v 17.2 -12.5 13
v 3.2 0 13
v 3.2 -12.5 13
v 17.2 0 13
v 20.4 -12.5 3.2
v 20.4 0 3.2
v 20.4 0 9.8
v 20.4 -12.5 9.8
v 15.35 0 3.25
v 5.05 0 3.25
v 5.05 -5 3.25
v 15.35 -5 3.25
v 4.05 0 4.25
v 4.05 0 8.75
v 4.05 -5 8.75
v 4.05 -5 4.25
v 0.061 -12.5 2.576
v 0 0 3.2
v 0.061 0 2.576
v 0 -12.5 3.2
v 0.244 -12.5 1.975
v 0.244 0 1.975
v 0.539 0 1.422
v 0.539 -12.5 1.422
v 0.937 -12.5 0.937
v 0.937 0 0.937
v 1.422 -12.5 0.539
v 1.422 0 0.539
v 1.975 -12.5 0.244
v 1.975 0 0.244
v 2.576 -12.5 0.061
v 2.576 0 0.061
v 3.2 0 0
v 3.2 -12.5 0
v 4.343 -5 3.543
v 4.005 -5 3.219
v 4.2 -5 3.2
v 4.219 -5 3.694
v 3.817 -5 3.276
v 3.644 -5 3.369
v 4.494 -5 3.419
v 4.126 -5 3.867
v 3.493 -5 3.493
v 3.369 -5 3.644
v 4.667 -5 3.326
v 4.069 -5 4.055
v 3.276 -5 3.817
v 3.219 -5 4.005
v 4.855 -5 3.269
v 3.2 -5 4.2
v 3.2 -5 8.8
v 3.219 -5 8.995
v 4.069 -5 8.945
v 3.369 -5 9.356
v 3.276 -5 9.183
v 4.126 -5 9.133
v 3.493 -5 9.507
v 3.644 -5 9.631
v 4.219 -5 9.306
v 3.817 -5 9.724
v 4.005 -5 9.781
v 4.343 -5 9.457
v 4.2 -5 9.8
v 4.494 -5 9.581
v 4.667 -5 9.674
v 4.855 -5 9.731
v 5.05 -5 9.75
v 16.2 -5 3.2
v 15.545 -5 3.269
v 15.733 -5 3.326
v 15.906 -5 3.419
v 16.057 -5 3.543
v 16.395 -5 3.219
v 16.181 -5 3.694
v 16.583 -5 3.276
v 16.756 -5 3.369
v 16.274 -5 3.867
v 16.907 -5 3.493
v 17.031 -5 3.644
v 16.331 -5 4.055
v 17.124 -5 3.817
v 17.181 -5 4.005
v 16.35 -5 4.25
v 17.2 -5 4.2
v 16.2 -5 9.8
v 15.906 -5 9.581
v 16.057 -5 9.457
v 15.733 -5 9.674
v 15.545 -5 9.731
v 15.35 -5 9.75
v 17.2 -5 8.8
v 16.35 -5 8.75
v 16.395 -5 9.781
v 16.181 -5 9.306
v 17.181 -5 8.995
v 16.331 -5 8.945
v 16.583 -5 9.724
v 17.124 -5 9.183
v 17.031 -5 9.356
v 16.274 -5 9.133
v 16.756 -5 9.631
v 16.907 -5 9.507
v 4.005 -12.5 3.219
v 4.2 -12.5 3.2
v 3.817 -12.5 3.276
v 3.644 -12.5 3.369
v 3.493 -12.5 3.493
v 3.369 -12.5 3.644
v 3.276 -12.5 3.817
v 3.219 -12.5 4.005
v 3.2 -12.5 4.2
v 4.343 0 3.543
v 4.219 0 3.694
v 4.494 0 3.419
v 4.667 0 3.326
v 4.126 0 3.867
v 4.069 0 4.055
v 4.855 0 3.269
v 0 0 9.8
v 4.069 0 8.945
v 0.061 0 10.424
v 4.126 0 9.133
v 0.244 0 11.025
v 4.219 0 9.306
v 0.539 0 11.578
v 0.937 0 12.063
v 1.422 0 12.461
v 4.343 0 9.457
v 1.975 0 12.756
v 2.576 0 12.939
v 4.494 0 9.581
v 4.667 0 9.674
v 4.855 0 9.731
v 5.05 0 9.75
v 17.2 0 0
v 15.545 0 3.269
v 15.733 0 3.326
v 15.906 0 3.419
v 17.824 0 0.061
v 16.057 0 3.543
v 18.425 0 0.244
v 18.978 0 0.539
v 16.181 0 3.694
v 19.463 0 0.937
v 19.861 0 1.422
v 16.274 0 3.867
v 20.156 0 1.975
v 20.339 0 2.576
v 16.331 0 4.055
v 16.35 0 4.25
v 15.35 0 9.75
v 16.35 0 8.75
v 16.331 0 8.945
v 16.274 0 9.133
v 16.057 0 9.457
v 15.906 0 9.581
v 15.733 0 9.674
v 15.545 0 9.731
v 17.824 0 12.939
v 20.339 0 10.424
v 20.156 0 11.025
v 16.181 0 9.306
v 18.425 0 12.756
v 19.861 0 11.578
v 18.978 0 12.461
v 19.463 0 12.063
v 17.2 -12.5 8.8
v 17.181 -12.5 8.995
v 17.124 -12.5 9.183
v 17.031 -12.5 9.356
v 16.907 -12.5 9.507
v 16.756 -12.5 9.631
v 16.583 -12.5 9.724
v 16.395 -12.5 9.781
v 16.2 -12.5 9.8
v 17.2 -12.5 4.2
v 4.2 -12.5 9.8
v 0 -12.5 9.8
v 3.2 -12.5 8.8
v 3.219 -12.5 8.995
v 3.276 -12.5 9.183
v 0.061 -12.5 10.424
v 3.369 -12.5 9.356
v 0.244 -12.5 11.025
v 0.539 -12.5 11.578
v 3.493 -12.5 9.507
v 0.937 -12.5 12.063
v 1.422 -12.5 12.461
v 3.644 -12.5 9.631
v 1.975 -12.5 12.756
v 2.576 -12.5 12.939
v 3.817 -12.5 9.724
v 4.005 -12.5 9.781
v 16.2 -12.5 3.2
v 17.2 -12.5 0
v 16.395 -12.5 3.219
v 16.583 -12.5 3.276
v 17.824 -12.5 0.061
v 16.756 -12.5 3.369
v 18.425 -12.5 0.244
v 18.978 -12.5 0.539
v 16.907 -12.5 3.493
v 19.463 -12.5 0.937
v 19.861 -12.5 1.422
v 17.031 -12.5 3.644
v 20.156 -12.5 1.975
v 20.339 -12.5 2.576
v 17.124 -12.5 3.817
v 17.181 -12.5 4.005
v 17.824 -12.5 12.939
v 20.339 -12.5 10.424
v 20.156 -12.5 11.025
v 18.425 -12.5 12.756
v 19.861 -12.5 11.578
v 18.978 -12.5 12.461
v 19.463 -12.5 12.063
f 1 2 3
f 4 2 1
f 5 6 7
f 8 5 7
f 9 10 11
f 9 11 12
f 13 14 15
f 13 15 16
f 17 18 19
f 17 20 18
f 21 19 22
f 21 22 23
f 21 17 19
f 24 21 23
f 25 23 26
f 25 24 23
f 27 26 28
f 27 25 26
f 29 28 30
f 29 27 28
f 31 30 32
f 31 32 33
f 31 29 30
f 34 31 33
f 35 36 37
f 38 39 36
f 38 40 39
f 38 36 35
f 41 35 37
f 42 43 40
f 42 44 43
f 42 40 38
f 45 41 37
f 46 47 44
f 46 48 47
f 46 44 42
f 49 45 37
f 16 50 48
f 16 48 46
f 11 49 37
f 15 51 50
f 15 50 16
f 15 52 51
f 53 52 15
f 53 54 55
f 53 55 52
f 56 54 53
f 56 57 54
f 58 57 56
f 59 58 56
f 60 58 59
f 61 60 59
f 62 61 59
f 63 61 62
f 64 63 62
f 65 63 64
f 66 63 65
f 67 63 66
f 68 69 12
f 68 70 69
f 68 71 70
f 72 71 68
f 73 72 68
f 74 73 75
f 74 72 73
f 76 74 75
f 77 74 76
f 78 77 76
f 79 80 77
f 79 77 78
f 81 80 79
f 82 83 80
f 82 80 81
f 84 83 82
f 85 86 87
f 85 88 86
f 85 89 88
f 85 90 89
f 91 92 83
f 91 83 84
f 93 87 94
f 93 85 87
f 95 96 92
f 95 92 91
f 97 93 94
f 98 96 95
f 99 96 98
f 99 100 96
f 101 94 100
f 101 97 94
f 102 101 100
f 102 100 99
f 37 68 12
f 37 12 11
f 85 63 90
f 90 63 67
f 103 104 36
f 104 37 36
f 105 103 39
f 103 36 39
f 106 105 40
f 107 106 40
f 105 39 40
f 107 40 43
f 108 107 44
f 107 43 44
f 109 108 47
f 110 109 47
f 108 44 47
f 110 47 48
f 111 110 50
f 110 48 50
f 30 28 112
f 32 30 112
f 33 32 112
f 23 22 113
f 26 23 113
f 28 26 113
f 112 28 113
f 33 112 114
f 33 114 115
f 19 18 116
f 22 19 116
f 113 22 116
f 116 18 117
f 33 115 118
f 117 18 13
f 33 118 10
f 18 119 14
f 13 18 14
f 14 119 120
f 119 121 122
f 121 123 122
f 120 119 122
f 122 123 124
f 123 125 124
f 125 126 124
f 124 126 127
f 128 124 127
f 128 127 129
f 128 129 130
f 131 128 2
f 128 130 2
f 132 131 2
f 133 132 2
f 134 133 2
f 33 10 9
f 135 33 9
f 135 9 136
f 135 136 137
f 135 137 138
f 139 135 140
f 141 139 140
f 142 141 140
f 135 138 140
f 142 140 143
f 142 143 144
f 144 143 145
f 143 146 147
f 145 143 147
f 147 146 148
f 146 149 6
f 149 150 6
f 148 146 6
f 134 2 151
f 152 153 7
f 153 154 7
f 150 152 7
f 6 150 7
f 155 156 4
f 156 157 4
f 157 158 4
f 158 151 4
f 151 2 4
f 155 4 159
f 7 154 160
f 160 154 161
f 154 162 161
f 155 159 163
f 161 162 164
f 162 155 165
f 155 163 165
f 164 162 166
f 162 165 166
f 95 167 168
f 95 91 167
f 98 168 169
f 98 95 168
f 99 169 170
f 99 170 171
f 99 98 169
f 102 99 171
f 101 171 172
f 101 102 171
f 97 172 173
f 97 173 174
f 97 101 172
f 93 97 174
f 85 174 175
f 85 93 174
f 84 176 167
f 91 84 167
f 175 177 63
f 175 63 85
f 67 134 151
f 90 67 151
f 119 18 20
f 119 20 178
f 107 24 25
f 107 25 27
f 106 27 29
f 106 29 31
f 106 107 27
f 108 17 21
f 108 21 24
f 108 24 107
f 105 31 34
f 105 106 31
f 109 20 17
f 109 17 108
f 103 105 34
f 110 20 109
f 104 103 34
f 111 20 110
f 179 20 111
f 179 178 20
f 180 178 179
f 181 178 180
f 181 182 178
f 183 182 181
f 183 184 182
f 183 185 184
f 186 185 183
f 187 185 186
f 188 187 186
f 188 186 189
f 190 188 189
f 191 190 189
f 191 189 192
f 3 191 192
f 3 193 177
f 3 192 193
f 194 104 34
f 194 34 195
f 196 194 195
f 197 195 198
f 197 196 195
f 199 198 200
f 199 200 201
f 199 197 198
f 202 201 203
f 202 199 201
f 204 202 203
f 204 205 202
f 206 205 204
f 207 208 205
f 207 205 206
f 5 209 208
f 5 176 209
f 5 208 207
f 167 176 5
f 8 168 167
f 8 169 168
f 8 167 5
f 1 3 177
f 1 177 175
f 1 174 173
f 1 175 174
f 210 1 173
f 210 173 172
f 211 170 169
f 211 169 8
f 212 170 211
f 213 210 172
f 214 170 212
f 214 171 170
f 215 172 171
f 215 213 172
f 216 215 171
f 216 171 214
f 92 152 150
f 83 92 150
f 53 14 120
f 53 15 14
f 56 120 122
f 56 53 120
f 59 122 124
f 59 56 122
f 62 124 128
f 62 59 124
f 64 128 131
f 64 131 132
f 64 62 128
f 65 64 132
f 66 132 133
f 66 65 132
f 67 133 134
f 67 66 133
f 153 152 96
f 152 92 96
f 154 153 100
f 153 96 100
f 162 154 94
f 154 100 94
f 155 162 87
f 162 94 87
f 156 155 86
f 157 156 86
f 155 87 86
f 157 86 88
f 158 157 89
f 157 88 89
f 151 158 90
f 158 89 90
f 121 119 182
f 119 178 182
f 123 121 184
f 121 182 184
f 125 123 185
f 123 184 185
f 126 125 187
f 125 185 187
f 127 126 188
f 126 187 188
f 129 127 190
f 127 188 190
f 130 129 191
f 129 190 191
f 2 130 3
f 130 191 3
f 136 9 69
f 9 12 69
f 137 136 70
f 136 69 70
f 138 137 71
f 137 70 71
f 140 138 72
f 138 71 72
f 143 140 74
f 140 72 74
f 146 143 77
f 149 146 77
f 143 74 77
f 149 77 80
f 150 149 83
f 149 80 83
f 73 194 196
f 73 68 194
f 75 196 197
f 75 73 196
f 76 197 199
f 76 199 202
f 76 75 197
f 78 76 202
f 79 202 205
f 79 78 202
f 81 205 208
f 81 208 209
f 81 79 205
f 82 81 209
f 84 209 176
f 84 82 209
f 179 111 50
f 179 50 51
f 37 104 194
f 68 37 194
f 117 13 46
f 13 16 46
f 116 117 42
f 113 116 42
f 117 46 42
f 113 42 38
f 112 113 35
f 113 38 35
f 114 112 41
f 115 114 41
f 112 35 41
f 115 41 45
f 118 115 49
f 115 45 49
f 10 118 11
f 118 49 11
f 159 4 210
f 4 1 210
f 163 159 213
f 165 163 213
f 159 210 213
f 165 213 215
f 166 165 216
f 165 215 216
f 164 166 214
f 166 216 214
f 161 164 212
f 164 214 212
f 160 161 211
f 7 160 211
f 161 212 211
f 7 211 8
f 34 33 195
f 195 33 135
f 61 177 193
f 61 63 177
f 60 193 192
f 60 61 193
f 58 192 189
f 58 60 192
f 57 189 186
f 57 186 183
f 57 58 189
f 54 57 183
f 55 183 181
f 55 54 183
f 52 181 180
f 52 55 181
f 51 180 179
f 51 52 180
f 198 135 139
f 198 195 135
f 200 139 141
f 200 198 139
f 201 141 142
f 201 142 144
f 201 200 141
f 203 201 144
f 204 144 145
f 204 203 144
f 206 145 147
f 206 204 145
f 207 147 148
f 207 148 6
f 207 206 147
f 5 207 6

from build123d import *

# Parameters (mm, degrees)
SKETCH058_W     = 20.4
SKETCH058_H     = 13
PAD032_DEPTH    = 12.5
SKETCH059_W     = 14
SKETCH059_H     = 6.6
POCKET027_DEPTH = 7.5
SKETCH060_W     = 12.3
SKETCH060_H     = 6.5
POCKET028_DEPTH = 5
FILLET027_R     = 1
FILLET028_R     = 3.2


with BuildPart() as part:
    # Sketch058 → Pad032 (new body)
    with BuildSketch(Plane.XZ):
        with Locations((10.2, 6.5)):
            Rectangle(SKETCH058_W, SKETCH058_H)
    extrude(amount=PAD032_DEPTH)

    # Sketch059 (on Face6 of Pad032) → Pocket027 (cut)
    with BuildSketch(Plane.XZ.offset(12.5)):
        with Locations((10.2, 6.5)):
            Rectangle(SKETCH059_W, SKETCH059_H)
    extrude(amount=-POCKET027_DEPTH, mode=Mode.SUBTRACT)

    # Sketch060 (on Face4 of Pocket027) → Pocket028 (cut)
    with BuildSketch(Plane(origin=(0, 0, 0), x_dir=(1, 0, 0), z_dir=(0, 1, 0))):
        with Locations((10.2, -6.5)):
            Rectangle(SKETCH060_W, SKETCH060_H)
    extrude(amount=-POCKET028_DEPTH, mode=Mode.SUBTRACT)

    # Fillet027
    fillet027_edges = [part.edges().sort_by_distance(p)[0] for p in [
        (16.35, -2.5, 9.75),
        (4.05, -2.5, 9.75),
        (4.05, -2.5, 3.25),
        (16.35, -2.5, 3.25),
        (17.2, -8.75, 9.8),
        (17.2, -8.75, 3.2),
        (3.2, -8.75, 3.2),
        (3.2, -8.75, 9.8),
    ]]
    fillet(fillet027_edges, radius=FILLET027_R)

    # Fillet028
    fillet028_edges = [part.edges().sort_by_distance(p)[0] for p in [
        (0, -6.25, 13),
        (0, -6.25, 0),
        (20.4, -6.25, 13),
        (20.4, -6.25, 0),
    ]]
    fillet(fillet028_edges, radius=FILLET028_R)


solid = part.part
